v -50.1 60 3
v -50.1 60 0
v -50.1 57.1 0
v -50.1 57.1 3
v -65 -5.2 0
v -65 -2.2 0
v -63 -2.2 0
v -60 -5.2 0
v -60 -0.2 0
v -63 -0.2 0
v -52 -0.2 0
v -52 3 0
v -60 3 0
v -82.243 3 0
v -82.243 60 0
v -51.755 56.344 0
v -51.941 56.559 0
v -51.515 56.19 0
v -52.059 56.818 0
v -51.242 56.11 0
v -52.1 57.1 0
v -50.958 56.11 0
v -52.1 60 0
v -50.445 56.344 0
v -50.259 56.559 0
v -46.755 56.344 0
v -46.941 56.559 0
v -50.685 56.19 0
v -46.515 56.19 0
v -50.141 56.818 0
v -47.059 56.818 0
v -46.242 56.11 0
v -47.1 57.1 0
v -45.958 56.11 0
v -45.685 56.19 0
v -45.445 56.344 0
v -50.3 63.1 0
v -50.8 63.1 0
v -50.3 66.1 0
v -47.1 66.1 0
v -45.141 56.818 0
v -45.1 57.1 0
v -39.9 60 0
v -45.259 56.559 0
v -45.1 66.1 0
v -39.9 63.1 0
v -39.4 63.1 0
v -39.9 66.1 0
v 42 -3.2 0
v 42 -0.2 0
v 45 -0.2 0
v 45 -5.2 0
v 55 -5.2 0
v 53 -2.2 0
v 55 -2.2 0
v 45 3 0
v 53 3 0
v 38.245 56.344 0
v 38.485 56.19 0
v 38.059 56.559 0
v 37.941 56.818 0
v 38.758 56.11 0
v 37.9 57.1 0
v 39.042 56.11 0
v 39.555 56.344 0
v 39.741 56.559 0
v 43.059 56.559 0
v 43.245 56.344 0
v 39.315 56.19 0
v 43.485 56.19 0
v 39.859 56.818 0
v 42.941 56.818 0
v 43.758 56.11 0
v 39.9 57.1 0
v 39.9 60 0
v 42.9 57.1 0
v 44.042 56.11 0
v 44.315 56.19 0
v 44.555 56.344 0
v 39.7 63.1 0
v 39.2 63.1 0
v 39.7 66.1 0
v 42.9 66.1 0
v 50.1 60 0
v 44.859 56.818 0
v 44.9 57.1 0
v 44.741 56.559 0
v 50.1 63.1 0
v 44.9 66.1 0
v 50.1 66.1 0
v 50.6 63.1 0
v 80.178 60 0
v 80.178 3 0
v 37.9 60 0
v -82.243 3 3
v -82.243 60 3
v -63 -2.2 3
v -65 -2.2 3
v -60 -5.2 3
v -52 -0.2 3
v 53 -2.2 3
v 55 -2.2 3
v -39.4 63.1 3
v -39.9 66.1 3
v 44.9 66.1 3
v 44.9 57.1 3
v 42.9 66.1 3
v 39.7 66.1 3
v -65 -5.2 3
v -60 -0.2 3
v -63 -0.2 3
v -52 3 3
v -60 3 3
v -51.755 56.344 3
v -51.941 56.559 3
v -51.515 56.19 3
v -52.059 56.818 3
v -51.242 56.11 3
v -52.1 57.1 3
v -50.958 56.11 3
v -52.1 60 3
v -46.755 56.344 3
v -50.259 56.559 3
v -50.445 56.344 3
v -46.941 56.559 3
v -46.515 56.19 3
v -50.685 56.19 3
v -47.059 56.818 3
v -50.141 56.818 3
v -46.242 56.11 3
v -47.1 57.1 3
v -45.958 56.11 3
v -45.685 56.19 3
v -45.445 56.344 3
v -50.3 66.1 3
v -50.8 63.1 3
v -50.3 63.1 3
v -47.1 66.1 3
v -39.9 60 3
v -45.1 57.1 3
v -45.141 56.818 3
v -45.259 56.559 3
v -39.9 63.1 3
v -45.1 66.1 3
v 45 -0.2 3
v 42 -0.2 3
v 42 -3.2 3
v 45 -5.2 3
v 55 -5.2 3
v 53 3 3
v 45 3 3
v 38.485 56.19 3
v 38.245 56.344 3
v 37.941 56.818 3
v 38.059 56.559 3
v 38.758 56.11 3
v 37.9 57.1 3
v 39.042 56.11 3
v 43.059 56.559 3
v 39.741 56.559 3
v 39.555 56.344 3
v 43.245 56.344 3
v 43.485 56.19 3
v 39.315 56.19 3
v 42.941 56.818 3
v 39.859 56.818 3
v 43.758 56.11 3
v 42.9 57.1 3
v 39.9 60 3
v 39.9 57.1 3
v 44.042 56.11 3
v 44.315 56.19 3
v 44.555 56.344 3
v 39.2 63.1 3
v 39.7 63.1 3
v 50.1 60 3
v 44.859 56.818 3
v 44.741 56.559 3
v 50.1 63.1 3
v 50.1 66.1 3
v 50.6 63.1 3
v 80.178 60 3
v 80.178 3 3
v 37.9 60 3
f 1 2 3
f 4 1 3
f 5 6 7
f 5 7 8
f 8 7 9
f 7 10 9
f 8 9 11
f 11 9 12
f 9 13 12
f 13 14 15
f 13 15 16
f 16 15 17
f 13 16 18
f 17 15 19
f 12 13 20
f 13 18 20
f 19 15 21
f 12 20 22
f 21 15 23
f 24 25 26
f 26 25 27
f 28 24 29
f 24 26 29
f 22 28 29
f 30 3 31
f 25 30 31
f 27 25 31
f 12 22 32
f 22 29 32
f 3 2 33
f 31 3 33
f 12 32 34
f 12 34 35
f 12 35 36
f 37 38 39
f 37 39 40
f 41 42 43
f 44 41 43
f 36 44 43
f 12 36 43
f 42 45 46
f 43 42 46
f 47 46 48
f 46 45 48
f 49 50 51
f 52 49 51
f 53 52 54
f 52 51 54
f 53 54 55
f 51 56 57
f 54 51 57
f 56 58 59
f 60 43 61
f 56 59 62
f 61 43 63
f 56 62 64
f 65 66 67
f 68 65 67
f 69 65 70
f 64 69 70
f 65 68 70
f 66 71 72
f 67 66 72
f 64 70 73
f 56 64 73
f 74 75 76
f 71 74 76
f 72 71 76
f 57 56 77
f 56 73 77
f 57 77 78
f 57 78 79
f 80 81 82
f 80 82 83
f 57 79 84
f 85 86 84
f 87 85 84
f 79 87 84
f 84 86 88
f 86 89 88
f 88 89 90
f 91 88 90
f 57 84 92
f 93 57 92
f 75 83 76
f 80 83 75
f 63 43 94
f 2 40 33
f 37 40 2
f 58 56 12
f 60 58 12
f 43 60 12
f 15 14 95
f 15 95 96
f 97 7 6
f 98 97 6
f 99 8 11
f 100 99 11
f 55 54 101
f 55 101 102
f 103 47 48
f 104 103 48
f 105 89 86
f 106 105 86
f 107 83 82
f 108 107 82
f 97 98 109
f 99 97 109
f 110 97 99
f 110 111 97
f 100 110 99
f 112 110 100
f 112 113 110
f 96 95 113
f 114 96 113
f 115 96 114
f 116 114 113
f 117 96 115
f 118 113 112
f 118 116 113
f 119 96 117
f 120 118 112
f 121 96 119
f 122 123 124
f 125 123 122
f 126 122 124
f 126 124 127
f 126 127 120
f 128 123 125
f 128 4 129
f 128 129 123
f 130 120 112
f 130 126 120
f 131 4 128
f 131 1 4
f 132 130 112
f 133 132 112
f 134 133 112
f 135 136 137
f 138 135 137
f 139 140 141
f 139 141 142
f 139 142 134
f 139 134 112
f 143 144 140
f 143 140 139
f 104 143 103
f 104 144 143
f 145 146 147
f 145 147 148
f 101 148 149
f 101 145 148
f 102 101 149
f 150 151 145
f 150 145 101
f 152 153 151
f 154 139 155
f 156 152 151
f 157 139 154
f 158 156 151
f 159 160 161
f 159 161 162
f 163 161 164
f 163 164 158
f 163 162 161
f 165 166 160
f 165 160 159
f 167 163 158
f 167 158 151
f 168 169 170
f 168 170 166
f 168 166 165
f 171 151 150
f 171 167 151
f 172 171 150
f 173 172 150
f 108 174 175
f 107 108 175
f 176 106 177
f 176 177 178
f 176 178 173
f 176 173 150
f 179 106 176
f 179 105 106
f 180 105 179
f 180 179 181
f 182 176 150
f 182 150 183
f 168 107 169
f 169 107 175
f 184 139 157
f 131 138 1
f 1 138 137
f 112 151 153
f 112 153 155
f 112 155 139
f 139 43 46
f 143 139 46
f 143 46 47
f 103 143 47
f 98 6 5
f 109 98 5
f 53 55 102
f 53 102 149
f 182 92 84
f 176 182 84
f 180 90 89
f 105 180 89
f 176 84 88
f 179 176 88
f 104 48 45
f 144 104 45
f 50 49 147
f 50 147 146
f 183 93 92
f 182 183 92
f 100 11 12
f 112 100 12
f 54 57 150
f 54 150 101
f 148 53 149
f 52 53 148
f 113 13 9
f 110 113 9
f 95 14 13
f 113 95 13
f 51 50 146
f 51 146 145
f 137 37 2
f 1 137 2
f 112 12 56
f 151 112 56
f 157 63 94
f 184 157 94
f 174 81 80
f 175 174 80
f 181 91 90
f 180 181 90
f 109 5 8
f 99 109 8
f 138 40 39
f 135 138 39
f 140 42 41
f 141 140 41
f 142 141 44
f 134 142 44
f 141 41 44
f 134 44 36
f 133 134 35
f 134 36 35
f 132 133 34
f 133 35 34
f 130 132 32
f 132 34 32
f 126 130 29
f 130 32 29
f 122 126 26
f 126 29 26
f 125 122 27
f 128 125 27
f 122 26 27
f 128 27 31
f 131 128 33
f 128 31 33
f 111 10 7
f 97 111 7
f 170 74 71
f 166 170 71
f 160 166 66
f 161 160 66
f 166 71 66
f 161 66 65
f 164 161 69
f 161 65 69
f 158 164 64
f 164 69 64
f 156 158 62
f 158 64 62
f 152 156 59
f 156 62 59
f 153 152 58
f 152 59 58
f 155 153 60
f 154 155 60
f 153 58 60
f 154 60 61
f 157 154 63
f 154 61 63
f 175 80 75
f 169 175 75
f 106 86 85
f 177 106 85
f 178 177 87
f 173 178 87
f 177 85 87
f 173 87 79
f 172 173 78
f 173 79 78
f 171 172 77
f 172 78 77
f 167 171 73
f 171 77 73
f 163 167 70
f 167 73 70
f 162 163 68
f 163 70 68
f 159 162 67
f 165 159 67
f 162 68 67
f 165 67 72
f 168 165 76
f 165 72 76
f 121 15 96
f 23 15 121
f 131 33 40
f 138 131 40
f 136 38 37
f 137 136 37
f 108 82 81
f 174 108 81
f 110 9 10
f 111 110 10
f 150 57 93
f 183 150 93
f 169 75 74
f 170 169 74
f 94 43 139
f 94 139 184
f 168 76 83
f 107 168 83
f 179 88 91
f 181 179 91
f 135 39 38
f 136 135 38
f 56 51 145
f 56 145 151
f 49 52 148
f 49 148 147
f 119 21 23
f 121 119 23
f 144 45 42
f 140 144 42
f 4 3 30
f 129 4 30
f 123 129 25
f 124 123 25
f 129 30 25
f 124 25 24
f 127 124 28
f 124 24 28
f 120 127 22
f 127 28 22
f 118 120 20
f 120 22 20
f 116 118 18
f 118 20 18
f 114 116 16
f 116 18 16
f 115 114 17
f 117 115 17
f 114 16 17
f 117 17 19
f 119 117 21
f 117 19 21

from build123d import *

# Parameters (mm, degrees)
SKETCH1_W            = 162.421633227
SKETCH1_H            = 57
BOSS_EXTRUDE1_DEPTH  = 3
BOTTOM_HOOKS_DEPTH   = 3
TOP_TABS_DEPTH       = 3
TOP_TAB_RELIEF_REACH = 107.556


with BuildPart() as part:
    # Sketch1 → Boss-Extrude1 (new body)
    with BuildSketch(Plane.XY):
        with Locations((-1.032340883, 31.5)):
            Rectangle(SKETCH1_W, SKETCH1_H)
    extrude(amount=BOSS_EXTRUDE1_DEPTH)

    # Sketch2 → bottom hooks (add)
    with BuildSketch(Plane(origin=(0, 0, 0), x_dir=(-1, 0, 0), z_dir=(0, 0, -1))):
        Polygon((52, 3), (60, 3), (60, -0.2), (63, -0.2), (63, -2.2), (65, -2.2), (65, -5.2), (60, -5.2), (52, -0.2), align=None)
        Polygon((-53, -2.2), (-55, -2.2), (-55, -5.2), (-45, -5.2), (-42, -3.2), (-42, -0.2), (-45, -0.2), (-45, 3), (-53, 3), align=None)
    extrude(amount=-BOTTOM_HOOKS_DEPTH)

    # Sketch3 → top tabs (add)
    with BuildSketch(Plane(origin=(0, 0, 0), x_dir=(-1, 0, 0), z_dir=(0, 0, -1))):
        with BuildLine():
            Line((-39.7, 63.1), (-39.9, 60))
            Line((-39.9, 60), (-39.9, 57.1))
            ThreePointArc((-39.9, 57.1), (-38.9, 56.1), (-37.9, 57.1))
            Line((-37.9, 57.1), (-37.9, 60))
            Line((-37.9, 60), (-35.9, 60))
            Line((-35.9, 60), (-35.9, 53))
            Line((-35.9, 53), (-52.1, 53))
            Line((-52.1, 53), (-52.1, 60))
            Line((-52.1, 60), (-50.1, 60))
            Line((-50.1, 60), (-50.1, 63.1))
            Line((-50.1, 63.1), (-50.6, 63.1))
            Line((-50.6, 63.1), (-50.1, 66.1))
            Line((-50.1, 66.1), (-44.9, 66.1))
            Line((-44.9, 66.1), (-44.9, 57.1))
            ThreePointArc((-44.9, 57.1), (-43.9, 56.1), (-42.9, 57.1))
            Line((-42.9, 57.1), (-42.9, 66.1))
            Line((-42.9, 66.1), (-39.7, 66.1))
            Line((-39.7, 66.1), (-39.2, 63.1))
            Line((-39.2, 63.1), (-39.7, 63.1))
        make_face()
        with BuildLine():
            Line((50.3, 63.1), (50.1, 60))
            Line((50.1, 60), (50.1, 57.1))
            ThreePointArc((50.1, 57.1), (51.1, 56.1), (52.1, 57.1))
            Line((52.1, 57.1), (52.1, 60))
            Line((52.1, 60), (54.1, 60))
            Line((54.1, 60), (54.1, 53))
            Line((54.1, 53), (37.9, 53))
            Line((37.9, 53), (37.9, 60))
            Line((37.9, 60), (39.9, 60))
            Line((39.9, 60), (39.9, 63.1))
            Line((39.9, 63.1), (39.4, 63.1))
            Line((39.4, 63.1), (39.9, 66.1))
            Line((39.9, 66.1), (45.1, 66.1))
            Line((45.1, 66.1), (45.1, 57.1))
            ThreePointArc((45.1, 57.1), (46.1, 56.1), (47.1, 57.1))
            Line((47.1, 57.1), (47.1, 66.1))
            Line((47.1, 66.1), (50.3, 66.1))
            Line((50.3, 66.1), (50.8, 63.1))
            Line((50.8, 63.1), (50.3, 63.1))
        make_face()
    extrude(amount=-TOP_TABS_DEPTH)

    # Sketch4 → top tab relief (cut, up to next)
    with BuildSketch(Plane(origin=(0, 0, 0), x_dir=(-1, 0, 0), z_dir=(0, 0, -1)), mode=Mode.PRIVATE) as top_tab_relief_sk1:
        with BuildLine():
            Line((47.1, 57.1), (47.1, 66.1))
            Line((47.1, 66.1), (45.1, 66.1))
            Line((45.1, 66.1), (45.1, 57.1))
            ThreePointArc((45.1, 57.1), (46.1, 56.1), (47.1, 57.1))
        make_face()
    top_tab_relief_tool1 = extrude(top_tab_relief_sk1.sketch, amount=-TOP_TAB_RELIEF_REACH, mode=Mode.PRIVATE) & part.part
    # Sketch4 → top tab relief (cut, up to next)
    with BuildSketch(Plane(origin=(0, 0, 0), x_dir=(-1, 0, 0), z_dir=(0, 0, -1)), mode=Mode.PRIVATE) as top_tab_relief_sk2:
        with BuildLine():
            Line((50.1, 60), (50.1, 57.1))
            ThreePointArc((50.1, 57.1), (51.1, 56.1), (52.1, 57.1))
            Line((52.1, 57.1), (52.1, 60))
            Line((52.1, 60), (50.1, 60))
        make_face()
    top_tab_relief_tool2 = extrude(top_tab_relief_sk2.sketch, amount=-TOP_TAB_RELIEF_REACH, mode=Mode.PRIVATE) & part.part
    # Sketch4 → top tab relief (cut, up to next)
    with BuildSketch(Plane(origin=(0, 0, 0), x_dir=(-1, 0, 0), z_dir=(0, 0, -1)), mode=Mode.PRIVATE) as top_tab_relief_sk3:
        with BuildLine():
            Line((-44.9, 66.1), (-44.9, 57.1))
            ThreePointArc((-44.9, 57.1), (-43.9, 56.1), (-42.9, 57.1))
            Line((-42.9, 57.1), (-42.9, 66.1))
            Line((-42.9, 66.1), (-44.9, 66.1))
        make_face()
    top_tab_relief_tool3 = extrude(top_tab_relief_sk3.sketch, amount=-TOP_TAB_RELIEF_REACH, mode=Mode.PRIVATE) & part.part
    # Sketch4 → top tab relief (cut, up to next)
    with BuildSketch(Plane(origin=(0, 0, 0), x_dir=(-1, 0, 0), z_dir=(0, 0, -1)), mode=Mode.PRIVATE) as top_tab_relief_sk4:
        with BuildLine():
            Line((-39.9, 60), (-39.9, 57.1))
            ThreePointArc((-39.9, 57.1), (-38.9, 56.1), (-37.9, 57.1))
            Line((-37.9, 57.1), (-37.9, 60))
            Line((-37.9, 60), (-39.9, 60))
        make_face()
    top_tab_relief_tool4 = extrude(top_tab_relief_sk4.sketch, amount=-TOP_TAB_RELIEF_REACH, mode=Mode.PRIVATE) & part.part
    add(top_tab_relief_tool1.solids().sort_by_distance((-46.1, 61.204755, 0))[0], mode=Mode.SUBTRACT)
    add(top_tab_relief_tool2.solids().sort_by_distance((-51.1, 58.150542, 0))[0], mode=Mode.SUBTRACT)
    add(top_tab_relief_tool3.solids().sort_by_distance((43.9, 61.204755, 0))[0], mode=Mode.SUBTRACT)
    add(top_tab_relief_tool4.solids().sort_by_distance((38.9, 58.150542, 0))[0], mode=Mode.SUBTRACT)


solid = part.part
